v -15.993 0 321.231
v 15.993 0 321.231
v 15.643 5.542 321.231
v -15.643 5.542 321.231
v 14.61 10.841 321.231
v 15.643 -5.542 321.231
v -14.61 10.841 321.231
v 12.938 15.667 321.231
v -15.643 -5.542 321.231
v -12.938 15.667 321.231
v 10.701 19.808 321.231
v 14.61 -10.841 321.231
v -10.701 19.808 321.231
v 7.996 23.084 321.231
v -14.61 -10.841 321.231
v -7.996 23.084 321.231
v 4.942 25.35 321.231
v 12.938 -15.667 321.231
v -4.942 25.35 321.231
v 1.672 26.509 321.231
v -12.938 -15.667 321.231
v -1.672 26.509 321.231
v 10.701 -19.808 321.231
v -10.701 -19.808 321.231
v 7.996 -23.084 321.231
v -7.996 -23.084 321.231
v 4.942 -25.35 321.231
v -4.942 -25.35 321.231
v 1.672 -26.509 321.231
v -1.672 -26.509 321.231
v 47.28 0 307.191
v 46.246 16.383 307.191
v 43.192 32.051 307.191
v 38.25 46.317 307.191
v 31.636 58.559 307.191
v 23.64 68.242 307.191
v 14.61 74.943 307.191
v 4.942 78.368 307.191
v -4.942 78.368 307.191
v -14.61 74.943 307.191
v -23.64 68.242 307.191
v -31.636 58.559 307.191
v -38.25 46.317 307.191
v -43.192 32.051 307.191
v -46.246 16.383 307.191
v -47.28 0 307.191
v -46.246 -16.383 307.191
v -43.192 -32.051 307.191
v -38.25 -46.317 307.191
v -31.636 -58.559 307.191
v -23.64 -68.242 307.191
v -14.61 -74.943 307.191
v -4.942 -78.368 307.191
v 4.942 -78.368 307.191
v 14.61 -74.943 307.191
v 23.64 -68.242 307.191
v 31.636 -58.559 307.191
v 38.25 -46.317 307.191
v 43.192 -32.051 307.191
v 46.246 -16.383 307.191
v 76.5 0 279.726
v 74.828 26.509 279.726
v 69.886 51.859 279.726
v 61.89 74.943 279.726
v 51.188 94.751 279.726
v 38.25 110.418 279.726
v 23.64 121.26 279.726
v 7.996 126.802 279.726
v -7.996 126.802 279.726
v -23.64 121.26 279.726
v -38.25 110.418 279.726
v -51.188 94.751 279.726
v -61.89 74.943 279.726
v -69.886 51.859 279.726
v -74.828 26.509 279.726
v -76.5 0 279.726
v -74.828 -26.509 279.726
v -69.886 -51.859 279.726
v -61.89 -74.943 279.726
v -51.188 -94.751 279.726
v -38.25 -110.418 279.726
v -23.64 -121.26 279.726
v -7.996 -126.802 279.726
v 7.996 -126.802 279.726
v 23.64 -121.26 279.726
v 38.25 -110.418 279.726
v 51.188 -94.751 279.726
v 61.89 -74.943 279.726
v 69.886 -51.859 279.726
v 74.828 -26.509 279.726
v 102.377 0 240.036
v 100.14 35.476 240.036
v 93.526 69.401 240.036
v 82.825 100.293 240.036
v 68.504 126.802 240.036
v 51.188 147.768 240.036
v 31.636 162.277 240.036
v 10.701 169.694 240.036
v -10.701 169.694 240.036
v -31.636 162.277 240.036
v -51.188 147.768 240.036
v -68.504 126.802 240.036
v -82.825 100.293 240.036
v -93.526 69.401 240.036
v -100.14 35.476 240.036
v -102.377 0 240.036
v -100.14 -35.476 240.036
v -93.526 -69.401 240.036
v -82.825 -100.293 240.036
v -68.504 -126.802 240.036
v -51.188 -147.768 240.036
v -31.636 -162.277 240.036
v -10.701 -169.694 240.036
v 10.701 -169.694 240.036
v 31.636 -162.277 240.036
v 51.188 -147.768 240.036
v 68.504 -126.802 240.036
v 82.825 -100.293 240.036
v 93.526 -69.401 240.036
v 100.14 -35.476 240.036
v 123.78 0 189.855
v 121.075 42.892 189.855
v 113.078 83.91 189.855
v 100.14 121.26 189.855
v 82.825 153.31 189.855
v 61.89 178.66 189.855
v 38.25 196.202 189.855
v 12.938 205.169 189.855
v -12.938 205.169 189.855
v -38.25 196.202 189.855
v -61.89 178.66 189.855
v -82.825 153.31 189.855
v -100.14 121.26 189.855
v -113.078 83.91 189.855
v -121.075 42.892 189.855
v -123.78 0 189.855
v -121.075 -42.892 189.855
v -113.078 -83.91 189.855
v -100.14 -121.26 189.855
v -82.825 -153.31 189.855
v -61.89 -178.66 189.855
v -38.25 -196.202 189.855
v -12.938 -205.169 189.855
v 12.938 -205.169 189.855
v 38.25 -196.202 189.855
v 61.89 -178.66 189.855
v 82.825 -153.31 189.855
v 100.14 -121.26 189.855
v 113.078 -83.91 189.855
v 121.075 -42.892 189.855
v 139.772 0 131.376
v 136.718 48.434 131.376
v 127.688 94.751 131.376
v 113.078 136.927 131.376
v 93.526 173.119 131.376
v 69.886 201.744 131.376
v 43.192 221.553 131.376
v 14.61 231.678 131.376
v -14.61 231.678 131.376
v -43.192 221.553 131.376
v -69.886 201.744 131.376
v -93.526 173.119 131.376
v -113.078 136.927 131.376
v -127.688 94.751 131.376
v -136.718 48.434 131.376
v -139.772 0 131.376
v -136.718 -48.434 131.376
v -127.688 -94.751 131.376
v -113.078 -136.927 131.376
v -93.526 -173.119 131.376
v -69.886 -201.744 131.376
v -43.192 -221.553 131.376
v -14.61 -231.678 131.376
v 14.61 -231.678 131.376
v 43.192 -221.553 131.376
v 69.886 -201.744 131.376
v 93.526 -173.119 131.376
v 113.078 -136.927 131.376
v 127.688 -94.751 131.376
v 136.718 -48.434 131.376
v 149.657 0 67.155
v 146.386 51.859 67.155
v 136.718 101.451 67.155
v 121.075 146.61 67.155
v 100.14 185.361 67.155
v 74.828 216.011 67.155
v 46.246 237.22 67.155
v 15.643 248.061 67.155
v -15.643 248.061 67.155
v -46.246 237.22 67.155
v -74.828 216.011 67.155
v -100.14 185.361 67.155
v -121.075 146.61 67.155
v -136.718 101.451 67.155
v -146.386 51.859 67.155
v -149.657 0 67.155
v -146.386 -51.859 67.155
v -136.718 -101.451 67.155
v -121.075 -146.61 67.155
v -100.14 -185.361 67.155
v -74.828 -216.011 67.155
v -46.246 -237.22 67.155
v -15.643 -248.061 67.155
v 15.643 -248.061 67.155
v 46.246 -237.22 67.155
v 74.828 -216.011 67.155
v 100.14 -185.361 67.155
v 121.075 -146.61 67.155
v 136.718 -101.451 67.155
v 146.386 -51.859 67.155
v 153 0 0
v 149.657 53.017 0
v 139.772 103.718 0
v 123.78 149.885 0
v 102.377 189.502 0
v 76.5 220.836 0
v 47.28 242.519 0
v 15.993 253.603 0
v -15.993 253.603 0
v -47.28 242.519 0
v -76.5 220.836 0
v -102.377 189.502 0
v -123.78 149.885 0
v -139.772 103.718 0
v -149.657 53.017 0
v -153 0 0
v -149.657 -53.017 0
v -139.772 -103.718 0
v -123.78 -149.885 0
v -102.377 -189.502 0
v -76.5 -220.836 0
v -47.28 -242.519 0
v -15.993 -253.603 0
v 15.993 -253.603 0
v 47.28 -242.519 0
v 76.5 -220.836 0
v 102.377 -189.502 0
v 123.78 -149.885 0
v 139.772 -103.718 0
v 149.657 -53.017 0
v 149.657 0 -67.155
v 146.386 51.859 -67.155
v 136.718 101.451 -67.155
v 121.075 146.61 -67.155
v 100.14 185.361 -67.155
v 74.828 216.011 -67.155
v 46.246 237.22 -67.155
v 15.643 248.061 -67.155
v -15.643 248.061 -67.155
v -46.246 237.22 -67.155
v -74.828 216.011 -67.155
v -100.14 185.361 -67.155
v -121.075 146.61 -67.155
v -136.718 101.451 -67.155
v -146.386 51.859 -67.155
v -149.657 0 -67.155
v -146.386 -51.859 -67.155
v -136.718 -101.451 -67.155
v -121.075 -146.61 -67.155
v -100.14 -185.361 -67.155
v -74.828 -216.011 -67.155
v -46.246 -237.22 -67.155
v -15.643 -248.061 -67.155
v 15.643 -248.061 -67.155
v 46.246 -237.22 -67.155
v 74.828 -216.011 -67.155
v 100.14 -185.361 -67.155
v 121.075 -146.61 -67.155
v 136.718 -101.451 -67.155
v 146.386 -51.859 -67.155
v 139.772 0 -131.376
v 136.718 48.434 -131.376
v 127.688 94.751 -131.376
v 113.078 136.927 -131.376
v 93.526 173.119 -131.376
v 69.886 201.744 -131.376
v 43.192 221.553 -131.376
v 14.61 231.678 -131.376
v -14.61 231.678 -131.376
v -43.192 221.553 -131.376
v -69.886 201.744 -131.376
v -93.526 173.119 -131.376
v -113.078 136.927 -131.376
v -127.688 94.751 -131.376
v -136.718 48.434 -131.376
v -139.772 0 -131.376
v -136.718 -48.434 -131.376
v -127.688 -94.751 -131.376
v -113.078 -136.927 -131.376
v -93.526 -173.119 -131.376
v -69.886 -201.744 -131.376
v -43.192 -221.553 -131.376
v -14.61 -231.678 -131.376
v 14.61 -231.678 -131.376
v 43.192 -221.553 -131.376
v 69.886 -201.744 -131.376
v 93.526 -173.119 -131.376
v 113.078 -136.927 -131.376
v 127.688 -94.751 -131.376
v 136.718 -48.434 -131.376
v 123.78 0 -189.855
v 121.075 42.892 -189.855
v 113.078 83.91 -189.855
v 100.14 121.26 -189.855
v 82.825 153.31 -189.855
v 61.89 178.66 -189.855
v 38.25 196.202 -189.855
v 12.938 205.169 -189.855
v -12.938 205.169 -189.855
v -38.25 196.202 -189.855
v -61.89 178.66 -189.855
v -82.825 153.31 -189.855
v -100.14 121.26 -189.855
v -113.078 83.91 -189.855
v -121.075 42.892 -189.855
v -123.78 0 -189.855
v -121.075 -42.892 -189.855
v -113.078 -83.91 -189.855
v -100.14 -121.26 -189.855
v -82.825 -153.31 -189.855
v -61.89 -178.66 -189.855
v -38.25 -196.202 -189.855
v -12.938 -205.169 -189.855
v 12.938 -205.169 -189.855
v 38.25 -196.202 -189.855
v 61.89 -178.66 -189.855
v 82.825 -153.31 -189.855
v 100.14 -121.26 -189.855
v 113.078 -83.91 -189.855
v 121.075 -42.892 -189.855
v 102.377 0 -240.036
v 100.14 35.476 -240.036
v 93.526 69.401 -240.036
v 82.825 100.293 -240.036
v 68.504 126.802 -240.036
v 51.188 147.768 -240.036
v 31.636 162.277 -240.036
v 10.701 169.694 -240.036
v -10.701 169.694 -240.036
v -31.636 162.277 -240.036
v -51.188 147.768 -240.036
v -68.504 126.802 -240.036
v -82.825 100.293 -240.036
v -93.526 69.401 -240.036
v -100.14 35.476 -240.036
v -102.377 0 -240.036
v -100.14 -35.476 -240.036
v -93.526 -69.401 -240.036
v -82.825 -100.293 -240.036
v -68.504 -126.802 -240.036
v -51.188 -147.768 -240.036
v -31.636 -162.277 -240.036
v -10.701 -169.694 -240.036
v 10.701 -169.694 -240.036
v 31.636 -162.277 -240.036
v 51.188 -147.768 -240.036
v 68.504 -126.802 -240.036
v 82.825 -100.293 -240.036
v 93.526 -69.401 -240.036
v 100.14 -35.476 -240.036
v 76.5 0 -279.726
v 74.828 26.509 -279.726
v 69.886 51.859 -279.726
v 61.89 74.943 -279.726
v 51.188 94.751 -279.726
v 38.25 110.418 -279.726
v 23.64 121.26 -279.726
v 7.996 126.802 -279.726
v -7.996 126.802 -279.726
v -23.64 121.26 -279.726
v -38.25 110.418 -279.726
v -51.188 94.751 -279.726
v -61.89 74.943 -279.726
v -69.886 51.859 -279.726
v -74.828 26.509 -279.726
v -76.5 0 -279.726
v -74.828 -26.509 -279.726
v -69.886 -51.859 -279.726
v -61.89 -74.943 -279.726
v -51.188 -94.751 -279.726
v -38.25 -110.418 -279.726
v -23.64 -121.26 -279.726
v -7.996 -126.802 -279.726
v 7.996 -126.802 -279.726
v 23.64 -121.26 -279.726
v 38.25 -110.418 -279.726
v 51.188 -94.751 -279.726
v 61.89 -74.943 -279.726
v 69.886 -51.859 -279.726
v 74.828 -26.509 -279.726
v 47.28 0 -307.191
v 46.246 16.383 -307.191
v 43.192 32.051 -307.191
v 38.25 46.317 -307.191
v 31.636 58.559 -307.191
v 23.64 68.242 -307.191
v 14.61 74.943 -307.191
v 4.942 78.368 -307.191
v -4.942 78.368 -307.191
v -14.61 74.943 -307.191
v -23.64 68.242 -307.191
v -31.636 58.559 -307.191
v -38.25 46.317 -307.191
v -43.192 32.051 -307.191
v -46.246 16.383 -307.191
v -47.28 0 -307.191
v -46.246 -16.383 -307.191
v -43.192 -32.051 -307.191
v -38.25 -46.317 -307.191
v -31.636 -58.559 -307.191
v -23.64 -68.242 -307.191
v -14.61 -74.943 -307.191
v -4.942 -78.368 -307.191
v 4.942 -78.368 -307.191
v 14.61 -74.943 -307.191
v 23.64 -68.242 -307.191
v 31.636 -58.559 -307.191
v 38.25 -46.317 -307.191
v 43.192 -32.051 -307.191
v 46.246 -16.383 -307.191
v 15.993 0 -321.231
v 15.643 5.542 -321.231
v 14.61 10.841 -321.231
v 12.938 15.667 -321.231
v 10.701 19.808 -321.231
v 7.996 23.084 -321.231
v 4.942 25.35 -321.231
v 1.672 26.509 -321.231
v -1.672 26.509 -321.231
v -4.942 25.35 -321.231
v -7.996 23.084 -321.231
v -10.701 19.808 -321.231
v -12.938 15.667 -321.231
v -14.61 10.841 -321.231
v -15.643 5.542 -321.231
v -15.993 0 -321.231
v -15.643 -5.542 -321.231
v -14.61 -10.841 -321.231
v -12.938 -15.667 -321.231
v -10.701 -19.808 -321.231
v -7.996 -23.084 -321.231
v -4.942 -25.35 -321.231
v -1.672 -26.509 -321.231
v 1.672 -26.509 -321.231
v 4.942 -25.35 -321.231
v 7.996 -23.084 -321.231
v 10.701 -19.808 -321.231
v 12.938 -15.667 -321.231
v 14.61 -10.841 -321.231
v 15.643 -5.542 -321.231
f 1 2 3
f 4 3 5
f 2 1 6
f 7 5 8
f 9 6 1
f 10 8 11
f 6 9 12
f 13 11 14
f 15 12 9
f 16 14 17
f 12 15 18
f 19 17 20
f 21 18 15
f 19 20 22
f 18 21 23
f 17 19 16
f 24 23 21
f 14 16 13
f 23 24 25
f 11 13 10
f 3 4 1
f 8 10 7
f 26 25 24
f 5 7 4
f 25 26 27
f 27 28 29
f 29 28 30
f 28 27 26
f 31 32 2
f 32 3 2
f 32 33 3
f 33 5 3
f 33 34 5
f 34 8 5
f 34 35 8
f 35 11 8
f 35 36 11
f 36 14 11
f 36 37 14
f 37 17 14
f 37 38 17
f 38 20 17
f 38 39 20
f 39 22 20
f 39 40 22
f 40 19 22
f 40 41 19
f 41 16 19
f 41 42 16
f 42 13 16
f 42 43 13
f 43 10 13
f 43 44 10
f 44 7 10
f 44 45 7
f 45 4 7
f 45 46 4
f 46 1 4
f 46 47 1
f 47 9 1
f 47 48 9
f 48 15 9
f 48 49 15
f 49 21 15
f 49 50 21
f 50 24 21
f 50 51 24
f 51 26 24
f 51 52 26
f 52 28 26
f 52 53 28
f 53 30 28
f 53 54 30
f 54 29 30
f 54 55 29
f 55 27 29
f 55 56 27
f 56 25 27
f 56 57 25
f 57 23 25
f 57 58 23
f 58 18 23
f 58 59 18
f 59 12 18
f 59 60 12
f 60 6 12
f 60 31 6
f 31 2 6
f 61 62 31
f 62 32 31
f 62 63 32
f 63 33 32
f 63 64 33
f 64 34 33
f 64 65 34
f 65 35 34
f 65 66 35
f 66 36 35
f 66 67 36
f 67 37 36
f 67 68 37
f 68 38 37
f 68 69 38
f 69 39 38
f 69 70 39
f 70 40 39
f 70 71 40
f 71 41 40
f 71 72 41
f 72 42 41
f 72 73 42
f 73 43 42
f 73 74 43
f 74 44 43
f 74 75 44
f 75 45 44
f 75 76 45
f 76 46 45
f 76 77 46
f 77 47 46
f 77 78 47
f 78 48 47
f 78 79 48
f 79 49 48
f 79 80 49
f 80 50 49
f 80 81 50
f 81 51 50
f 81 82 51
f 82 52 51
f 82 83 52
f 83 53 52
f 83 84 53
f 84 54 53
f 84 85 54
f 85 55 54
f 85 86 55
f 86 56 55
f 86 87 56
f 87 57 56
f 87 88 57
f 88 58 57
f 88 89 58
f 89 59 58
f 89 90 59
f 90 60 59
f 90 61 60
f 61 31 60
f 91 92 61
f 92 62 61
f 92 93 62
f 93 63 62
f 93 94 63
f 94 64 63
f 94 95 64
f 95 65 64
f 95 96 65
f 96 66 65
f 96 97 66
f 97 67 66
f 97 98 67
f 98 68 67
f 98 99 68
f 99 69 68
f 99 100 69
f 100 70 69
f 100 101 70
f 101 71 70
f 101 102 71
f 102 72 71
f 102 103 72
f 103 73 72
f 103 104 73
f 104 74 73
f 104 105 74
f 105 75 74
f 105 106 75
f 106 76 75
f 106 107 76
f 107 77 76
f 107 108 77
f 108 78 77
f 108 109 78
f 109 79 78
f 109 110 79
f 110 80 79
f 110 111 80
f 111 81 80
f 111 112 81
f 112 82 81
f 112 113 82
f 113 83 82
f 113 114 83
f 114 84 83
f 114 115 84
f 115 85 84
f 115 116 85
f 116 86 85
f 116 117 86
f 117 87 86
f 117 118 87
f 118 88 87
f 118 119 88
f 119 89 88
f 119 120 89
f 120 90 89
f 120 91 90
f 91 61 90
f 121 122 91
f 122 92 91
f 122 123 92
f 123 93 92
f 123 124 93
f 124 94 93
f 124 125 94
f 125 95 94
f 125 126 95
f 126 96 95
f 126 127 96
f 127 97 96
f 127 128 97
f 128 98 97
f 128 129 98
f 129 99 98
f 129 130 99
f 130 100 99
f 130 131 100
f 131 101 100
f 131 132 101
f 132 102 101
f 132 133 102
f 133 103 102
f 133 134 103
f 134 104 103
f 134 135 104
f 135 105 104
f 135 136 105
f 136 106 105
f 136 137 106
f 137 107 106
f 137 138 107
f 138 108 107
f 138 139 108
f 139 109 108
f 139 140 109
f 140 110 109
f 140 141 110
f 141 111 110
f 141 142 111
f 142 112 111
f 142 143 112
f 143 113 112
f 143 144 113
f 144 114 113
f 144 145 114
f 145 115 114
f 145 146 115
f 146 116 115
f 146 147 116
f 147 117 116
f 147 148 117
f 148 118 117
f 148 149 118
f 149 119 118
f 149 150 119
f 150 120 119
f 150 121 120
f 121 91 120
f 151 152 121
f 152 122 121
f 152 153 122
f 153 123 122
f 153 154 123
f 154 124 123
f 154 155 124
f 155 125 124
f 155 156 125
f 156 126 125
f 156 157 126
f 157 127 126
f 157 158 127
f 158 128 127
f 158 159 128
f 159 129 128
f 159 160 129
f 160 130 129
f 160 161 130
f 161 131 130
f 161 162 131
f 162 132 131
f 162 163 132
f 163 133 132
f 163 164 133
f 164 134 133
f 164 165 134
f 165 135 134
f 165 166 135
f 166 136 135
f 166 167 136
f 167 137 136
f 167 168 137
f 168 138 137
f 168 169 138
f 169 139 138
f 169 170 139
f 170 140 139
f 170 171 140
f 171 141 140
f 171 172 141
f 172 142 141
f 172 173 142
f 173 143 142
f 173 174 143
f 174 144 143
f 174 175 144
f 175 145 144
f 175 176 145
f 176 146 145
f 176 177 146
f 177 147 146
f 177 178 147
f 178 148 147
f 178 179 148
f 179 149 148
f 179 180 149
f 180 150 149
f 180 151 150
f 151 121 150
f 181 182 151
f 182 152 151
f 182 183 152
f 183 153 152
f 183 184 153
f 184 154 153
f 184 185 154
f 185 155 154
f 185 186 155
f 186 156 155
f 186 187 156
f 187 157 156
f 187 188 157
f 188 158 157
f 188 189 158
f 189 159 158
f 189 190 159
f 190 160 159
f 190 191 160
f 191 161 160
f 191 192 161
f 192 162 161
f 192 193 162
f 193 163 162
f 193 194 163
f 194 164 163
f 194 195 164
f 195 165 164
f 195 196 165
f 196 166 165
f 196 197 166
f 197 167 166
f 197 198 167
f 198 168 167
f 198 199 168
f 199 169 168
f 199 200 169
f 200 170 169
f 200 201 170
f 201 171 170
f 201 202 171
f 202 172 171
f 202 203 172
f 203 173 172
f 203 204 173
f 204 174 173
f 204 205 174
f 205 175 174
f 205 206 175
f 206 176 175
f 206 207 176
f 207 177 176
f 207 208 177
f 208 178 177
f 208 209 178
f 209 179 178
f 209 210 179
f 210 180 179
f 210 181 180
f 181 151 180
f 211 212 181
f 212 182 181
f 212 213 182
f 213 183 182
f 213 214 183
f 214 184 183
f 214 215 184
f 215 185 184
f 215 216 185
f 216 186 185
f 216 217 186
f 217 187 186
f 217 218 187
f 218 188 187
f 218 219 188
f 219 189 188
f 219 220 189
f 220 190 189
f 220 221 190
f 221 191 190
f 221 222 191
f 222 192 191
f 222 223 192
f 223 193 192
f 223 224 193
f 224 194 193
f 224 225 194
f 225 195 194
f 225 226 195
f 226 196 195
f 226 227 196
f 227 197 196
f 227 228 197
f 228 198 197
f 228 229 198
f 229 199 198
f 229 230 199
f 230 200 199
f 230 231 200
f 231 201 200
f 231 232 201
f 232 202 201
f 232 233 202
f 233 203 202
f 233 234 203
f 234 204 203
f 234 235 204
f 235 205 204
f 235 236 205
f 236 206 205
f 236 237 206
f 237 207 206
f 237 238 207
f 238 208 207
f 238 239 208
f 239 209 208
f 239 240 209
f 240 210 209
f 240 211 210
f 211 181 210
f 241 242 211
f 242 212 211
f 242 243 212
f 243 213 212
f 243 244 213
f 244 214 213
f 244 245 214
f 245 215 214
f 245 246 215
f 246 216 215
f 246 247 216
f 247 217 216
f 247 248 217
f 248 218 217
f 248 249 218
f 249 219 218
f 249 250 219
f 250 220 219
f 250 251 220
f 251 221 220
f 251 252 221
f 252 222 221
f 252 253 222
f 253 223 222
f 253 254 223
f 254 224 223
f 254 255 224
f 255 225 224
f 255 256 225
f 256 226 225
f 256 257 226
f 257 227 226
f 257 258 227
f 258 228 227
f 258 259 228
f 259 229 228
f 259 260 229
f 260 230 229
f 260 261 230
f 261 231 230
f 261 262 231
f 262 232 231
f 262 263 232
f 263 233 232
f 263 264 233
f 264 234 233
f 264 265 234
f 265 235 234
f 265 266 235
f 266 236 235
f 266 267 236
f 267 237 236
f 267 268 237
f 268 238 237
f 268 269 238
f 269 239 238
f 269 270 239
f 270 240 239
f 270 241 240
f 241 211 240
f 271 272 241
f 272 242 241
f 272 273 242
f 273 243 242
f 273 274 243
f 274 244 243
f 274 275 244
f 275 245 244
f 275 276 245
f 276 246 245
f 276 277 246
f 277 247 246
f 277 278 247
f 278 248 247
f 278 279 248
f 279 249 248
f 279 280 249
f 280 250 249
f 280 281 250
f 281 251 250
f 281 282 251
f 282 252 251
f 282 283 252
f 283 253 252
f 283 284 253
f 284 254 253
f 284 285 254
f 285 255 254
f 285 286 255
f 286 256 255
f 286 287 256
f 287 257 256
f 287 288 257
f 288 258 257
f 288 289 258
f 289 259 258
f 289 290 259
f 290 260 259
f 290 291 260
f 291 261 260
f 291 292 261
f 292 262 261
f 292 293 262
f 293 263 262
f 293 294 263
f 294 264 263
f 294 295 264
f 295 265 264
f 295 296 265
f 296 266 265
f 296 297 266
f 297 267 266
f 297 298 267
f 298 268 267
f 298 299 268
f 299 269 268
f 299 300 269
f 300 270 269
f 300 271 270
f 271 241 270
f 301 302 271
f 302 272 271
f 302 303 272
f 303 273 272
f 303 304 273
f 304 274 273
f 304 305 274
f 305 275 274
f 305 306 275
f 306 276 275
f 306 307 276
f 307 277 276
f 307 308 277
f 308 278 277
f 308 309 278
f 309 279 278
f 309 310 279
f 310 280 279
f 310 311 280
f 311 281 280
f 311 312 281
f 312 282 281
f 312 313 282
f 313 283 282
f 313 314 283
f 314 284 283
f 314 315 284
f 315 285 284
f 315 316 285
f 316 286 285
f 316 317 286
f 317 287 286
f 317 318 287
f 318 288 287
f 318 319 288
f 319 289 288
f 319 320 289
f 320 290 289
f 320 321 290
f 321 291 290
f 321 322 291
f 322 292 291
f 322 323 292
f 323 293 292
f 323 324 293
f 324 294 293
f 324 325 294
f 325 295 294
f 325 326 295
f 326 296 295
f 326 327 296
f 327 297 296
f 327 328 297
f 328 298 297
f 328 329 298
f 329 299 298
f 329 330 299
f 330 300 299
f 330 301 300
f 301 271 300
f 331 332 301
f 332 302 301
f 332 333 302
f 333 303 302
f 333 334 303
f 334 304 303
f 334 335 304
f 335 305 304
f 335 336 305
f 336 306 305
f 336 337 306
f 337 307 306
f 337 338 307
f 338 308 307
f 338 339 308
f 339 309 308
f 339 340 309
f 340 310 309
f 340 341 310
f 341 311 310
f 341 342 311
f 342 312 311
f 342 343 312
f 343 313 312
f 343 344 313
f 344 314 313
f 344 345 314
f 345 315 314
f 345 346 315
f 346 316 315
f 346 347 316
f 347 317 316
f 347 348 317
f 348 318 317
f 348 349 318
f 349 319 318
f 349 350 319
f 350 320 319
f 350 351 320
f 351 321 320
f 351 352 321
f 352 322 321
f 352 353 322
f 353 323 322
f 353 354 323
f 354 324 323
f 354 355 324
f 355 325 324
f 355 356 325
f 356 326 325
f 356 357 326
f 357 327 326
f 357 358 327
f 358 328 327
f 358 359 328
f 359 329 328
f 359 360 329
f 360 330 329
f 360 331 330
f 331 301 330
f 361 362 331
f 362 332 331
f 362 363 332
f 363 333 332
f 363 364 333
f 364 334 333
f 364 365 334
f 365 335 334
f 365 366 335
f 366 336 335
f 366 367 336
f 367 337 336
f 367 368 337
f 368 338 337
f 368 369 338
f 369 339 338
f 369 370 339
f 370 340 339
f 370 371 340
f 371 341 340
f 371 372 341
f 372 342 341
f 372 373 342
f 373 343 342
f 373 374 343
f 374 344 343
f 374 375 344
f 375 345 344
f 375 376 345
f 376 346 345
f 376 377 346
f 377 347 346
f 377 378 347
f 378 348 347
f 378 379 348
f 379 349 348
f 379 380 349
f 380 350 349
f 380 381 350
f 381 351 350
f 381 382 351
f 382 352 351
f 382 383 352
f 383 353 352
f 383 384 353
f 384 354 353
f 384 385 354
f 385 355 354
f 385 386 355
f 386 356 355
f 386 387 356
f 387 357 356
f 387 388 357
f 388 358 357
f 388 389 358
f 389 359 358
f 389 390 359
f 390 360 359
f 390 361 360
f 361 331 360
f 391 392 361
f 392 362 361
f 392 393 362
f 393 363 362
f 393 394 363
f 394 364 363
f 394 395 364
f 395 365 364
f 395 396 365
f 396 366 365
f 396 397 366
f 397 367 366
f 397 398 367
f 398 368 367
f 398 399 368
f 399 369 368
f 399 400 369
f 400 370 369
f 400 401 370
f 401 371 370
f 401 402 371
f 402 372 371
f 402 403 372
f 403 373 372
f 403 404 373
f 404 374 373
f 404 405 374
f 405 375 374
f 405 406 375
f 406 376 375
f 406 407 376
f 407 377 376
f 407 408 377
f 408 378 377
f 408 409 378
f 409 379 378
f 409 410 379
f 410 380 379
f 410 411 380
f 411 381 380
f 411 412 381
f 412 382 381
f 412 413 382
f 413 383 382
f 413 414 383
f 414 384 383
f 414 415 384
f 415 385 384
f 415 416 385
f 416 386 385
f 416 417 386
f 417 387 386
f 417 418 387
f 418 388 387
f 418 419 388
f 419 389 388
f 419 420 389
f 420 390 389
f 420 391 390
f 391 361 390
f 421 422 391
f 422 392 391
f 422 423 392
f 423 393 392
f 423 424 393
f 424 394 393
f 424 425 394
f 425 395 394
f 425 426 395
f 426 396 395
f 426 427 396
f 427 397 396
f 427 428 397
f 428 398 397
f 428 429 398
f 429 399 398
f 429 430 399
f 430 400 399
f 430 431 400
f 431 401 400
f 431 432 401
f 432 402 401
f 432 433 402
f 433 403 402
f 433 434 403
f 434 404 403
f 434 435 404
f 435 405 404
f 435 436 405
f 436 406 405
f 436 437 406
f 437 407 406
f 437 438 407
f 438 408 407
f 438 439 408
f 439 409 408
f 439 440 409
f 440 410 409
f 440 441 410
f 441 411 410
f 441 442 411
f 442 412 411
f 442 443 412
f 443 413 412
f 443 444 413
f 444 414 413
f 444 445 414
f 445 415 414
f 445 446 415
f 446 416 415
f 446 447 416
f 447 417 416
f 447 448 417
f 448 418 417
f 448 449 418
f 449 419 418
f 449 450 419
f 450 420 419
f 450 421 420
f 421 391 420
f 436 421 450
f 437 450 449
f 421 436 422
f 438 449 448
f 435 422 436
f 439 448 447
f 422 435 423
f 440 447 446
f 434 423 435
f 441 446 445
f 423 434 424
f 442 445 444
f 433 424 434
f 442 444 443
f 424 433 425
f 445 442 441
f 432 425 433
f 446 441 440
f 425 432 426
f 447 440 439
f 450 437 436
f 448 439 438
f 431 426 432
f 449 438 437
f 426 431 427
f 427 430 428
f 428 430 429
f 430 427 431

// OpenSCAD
// Generated by SolidPython 1.0.1 on 2020-07-29 00:46:49


scale(v = [9, 15, 19]) {
	sphere(r = 17);
}
/***********************************************
*********      SolidPython code:      **********
************************************************
 
# import packages: SolidPython
from solid import *
from solid.utils import *
from itertools import chain, combinations, permutations


class Resize:

    def __init__(self, scad_file):
        self.scad_file = scad_file
        #self.scad_file = import_scad(scad_file)
        # cone/cylinder param:
        self.r1 = 0
        self.r2 = 0
        self.h = 0
        # rectangular prism param:
        self.w = 0
        self.l = 0
        # ellipse param:
        self.r = 0

    # import OpenScad code (file name corresponds to shape)


    # classify shape + parameters
    def assign(self, param1, param2, param3):
        if self.scad_file == 'cone.scad':
            self.r1 = param1
            self.r2 = param2
            self.h = param3
        elif self.scad_file == 'cylinder.scad':
            self.r1 = param1
            self.r2 = param2
            self.h = param3
        elif self.scad_file == 'rectangularPrism.scad':
            self.h = param1
            self.l = param2
            self.w = param3
        else:
            self.r = param1
            self.h = param2

    # resize parameters
    def iterate(self):
        x = range(3, 20, 2)
        i = 1
        if self.scad_file == 'cone.scad':
            tempList = list(permutations(x, 2))
            for temp in tempList:
                param1 = temp[0]
                param2 = temp[1]
                filepath = 'produced_scad_files/' + 'cone' + str(param1) + '_' + str(param2) + '_' + '.scad'
                scad_render_to_file(cylinder(h=param1, r1=param2, r2=0), filepath)

        elif self.scad_file == 'cylinder.scad':
            tempList = list(permutations(x, 3))
            for temp in tempList:
                param1 = temp[0]
                param2 = temp[1]
                filepath = 'produced_scad_files/' + 'cylinder' + str(param1) + '_' + str(param2) + '_' + '.scad'
                scad_render_to_file(cylinder(h=param1, r1=param2, r2=param2), filepath)

        elif self.scad_file == 'rectangularPrism.scad':
            tempList = list(permutations(x, 3))
            for temp in tempList:
                param1 = temp[0]
                param2 = temp[1]
                param3 = temp[2]
                filepath = 'produced_scad_files/' + 'rectangularPrism' + str(param1) + '_' + str(param2) + '_' + str(
                    param3) + '.scad'
                scad_render_to_file(cube(size=(param1, param2, param3)), filepath)

        elif self.scad_file == 'ellipse.scad':
            tempList = list(permutations(x, 4))
            for temp in tempList:
                param1 = temp[0]
                param2 = temp[1]
                param3 = temp[2]
                param4 = temp[3]
                filepath = 'produced_scad_files/' + 'ellipse' + str(param1) + '_' + str(param2) + '_' + str(param3) + '_' + str(param4) + '.scad'
                scad_render_to_file(scale([param1, param2, param3])(sphere(r=param4)), filepath)

    def render_to_scadfile(self):
        scad_render_to_file(scad, 'example.scad') 
 
************************************************/
